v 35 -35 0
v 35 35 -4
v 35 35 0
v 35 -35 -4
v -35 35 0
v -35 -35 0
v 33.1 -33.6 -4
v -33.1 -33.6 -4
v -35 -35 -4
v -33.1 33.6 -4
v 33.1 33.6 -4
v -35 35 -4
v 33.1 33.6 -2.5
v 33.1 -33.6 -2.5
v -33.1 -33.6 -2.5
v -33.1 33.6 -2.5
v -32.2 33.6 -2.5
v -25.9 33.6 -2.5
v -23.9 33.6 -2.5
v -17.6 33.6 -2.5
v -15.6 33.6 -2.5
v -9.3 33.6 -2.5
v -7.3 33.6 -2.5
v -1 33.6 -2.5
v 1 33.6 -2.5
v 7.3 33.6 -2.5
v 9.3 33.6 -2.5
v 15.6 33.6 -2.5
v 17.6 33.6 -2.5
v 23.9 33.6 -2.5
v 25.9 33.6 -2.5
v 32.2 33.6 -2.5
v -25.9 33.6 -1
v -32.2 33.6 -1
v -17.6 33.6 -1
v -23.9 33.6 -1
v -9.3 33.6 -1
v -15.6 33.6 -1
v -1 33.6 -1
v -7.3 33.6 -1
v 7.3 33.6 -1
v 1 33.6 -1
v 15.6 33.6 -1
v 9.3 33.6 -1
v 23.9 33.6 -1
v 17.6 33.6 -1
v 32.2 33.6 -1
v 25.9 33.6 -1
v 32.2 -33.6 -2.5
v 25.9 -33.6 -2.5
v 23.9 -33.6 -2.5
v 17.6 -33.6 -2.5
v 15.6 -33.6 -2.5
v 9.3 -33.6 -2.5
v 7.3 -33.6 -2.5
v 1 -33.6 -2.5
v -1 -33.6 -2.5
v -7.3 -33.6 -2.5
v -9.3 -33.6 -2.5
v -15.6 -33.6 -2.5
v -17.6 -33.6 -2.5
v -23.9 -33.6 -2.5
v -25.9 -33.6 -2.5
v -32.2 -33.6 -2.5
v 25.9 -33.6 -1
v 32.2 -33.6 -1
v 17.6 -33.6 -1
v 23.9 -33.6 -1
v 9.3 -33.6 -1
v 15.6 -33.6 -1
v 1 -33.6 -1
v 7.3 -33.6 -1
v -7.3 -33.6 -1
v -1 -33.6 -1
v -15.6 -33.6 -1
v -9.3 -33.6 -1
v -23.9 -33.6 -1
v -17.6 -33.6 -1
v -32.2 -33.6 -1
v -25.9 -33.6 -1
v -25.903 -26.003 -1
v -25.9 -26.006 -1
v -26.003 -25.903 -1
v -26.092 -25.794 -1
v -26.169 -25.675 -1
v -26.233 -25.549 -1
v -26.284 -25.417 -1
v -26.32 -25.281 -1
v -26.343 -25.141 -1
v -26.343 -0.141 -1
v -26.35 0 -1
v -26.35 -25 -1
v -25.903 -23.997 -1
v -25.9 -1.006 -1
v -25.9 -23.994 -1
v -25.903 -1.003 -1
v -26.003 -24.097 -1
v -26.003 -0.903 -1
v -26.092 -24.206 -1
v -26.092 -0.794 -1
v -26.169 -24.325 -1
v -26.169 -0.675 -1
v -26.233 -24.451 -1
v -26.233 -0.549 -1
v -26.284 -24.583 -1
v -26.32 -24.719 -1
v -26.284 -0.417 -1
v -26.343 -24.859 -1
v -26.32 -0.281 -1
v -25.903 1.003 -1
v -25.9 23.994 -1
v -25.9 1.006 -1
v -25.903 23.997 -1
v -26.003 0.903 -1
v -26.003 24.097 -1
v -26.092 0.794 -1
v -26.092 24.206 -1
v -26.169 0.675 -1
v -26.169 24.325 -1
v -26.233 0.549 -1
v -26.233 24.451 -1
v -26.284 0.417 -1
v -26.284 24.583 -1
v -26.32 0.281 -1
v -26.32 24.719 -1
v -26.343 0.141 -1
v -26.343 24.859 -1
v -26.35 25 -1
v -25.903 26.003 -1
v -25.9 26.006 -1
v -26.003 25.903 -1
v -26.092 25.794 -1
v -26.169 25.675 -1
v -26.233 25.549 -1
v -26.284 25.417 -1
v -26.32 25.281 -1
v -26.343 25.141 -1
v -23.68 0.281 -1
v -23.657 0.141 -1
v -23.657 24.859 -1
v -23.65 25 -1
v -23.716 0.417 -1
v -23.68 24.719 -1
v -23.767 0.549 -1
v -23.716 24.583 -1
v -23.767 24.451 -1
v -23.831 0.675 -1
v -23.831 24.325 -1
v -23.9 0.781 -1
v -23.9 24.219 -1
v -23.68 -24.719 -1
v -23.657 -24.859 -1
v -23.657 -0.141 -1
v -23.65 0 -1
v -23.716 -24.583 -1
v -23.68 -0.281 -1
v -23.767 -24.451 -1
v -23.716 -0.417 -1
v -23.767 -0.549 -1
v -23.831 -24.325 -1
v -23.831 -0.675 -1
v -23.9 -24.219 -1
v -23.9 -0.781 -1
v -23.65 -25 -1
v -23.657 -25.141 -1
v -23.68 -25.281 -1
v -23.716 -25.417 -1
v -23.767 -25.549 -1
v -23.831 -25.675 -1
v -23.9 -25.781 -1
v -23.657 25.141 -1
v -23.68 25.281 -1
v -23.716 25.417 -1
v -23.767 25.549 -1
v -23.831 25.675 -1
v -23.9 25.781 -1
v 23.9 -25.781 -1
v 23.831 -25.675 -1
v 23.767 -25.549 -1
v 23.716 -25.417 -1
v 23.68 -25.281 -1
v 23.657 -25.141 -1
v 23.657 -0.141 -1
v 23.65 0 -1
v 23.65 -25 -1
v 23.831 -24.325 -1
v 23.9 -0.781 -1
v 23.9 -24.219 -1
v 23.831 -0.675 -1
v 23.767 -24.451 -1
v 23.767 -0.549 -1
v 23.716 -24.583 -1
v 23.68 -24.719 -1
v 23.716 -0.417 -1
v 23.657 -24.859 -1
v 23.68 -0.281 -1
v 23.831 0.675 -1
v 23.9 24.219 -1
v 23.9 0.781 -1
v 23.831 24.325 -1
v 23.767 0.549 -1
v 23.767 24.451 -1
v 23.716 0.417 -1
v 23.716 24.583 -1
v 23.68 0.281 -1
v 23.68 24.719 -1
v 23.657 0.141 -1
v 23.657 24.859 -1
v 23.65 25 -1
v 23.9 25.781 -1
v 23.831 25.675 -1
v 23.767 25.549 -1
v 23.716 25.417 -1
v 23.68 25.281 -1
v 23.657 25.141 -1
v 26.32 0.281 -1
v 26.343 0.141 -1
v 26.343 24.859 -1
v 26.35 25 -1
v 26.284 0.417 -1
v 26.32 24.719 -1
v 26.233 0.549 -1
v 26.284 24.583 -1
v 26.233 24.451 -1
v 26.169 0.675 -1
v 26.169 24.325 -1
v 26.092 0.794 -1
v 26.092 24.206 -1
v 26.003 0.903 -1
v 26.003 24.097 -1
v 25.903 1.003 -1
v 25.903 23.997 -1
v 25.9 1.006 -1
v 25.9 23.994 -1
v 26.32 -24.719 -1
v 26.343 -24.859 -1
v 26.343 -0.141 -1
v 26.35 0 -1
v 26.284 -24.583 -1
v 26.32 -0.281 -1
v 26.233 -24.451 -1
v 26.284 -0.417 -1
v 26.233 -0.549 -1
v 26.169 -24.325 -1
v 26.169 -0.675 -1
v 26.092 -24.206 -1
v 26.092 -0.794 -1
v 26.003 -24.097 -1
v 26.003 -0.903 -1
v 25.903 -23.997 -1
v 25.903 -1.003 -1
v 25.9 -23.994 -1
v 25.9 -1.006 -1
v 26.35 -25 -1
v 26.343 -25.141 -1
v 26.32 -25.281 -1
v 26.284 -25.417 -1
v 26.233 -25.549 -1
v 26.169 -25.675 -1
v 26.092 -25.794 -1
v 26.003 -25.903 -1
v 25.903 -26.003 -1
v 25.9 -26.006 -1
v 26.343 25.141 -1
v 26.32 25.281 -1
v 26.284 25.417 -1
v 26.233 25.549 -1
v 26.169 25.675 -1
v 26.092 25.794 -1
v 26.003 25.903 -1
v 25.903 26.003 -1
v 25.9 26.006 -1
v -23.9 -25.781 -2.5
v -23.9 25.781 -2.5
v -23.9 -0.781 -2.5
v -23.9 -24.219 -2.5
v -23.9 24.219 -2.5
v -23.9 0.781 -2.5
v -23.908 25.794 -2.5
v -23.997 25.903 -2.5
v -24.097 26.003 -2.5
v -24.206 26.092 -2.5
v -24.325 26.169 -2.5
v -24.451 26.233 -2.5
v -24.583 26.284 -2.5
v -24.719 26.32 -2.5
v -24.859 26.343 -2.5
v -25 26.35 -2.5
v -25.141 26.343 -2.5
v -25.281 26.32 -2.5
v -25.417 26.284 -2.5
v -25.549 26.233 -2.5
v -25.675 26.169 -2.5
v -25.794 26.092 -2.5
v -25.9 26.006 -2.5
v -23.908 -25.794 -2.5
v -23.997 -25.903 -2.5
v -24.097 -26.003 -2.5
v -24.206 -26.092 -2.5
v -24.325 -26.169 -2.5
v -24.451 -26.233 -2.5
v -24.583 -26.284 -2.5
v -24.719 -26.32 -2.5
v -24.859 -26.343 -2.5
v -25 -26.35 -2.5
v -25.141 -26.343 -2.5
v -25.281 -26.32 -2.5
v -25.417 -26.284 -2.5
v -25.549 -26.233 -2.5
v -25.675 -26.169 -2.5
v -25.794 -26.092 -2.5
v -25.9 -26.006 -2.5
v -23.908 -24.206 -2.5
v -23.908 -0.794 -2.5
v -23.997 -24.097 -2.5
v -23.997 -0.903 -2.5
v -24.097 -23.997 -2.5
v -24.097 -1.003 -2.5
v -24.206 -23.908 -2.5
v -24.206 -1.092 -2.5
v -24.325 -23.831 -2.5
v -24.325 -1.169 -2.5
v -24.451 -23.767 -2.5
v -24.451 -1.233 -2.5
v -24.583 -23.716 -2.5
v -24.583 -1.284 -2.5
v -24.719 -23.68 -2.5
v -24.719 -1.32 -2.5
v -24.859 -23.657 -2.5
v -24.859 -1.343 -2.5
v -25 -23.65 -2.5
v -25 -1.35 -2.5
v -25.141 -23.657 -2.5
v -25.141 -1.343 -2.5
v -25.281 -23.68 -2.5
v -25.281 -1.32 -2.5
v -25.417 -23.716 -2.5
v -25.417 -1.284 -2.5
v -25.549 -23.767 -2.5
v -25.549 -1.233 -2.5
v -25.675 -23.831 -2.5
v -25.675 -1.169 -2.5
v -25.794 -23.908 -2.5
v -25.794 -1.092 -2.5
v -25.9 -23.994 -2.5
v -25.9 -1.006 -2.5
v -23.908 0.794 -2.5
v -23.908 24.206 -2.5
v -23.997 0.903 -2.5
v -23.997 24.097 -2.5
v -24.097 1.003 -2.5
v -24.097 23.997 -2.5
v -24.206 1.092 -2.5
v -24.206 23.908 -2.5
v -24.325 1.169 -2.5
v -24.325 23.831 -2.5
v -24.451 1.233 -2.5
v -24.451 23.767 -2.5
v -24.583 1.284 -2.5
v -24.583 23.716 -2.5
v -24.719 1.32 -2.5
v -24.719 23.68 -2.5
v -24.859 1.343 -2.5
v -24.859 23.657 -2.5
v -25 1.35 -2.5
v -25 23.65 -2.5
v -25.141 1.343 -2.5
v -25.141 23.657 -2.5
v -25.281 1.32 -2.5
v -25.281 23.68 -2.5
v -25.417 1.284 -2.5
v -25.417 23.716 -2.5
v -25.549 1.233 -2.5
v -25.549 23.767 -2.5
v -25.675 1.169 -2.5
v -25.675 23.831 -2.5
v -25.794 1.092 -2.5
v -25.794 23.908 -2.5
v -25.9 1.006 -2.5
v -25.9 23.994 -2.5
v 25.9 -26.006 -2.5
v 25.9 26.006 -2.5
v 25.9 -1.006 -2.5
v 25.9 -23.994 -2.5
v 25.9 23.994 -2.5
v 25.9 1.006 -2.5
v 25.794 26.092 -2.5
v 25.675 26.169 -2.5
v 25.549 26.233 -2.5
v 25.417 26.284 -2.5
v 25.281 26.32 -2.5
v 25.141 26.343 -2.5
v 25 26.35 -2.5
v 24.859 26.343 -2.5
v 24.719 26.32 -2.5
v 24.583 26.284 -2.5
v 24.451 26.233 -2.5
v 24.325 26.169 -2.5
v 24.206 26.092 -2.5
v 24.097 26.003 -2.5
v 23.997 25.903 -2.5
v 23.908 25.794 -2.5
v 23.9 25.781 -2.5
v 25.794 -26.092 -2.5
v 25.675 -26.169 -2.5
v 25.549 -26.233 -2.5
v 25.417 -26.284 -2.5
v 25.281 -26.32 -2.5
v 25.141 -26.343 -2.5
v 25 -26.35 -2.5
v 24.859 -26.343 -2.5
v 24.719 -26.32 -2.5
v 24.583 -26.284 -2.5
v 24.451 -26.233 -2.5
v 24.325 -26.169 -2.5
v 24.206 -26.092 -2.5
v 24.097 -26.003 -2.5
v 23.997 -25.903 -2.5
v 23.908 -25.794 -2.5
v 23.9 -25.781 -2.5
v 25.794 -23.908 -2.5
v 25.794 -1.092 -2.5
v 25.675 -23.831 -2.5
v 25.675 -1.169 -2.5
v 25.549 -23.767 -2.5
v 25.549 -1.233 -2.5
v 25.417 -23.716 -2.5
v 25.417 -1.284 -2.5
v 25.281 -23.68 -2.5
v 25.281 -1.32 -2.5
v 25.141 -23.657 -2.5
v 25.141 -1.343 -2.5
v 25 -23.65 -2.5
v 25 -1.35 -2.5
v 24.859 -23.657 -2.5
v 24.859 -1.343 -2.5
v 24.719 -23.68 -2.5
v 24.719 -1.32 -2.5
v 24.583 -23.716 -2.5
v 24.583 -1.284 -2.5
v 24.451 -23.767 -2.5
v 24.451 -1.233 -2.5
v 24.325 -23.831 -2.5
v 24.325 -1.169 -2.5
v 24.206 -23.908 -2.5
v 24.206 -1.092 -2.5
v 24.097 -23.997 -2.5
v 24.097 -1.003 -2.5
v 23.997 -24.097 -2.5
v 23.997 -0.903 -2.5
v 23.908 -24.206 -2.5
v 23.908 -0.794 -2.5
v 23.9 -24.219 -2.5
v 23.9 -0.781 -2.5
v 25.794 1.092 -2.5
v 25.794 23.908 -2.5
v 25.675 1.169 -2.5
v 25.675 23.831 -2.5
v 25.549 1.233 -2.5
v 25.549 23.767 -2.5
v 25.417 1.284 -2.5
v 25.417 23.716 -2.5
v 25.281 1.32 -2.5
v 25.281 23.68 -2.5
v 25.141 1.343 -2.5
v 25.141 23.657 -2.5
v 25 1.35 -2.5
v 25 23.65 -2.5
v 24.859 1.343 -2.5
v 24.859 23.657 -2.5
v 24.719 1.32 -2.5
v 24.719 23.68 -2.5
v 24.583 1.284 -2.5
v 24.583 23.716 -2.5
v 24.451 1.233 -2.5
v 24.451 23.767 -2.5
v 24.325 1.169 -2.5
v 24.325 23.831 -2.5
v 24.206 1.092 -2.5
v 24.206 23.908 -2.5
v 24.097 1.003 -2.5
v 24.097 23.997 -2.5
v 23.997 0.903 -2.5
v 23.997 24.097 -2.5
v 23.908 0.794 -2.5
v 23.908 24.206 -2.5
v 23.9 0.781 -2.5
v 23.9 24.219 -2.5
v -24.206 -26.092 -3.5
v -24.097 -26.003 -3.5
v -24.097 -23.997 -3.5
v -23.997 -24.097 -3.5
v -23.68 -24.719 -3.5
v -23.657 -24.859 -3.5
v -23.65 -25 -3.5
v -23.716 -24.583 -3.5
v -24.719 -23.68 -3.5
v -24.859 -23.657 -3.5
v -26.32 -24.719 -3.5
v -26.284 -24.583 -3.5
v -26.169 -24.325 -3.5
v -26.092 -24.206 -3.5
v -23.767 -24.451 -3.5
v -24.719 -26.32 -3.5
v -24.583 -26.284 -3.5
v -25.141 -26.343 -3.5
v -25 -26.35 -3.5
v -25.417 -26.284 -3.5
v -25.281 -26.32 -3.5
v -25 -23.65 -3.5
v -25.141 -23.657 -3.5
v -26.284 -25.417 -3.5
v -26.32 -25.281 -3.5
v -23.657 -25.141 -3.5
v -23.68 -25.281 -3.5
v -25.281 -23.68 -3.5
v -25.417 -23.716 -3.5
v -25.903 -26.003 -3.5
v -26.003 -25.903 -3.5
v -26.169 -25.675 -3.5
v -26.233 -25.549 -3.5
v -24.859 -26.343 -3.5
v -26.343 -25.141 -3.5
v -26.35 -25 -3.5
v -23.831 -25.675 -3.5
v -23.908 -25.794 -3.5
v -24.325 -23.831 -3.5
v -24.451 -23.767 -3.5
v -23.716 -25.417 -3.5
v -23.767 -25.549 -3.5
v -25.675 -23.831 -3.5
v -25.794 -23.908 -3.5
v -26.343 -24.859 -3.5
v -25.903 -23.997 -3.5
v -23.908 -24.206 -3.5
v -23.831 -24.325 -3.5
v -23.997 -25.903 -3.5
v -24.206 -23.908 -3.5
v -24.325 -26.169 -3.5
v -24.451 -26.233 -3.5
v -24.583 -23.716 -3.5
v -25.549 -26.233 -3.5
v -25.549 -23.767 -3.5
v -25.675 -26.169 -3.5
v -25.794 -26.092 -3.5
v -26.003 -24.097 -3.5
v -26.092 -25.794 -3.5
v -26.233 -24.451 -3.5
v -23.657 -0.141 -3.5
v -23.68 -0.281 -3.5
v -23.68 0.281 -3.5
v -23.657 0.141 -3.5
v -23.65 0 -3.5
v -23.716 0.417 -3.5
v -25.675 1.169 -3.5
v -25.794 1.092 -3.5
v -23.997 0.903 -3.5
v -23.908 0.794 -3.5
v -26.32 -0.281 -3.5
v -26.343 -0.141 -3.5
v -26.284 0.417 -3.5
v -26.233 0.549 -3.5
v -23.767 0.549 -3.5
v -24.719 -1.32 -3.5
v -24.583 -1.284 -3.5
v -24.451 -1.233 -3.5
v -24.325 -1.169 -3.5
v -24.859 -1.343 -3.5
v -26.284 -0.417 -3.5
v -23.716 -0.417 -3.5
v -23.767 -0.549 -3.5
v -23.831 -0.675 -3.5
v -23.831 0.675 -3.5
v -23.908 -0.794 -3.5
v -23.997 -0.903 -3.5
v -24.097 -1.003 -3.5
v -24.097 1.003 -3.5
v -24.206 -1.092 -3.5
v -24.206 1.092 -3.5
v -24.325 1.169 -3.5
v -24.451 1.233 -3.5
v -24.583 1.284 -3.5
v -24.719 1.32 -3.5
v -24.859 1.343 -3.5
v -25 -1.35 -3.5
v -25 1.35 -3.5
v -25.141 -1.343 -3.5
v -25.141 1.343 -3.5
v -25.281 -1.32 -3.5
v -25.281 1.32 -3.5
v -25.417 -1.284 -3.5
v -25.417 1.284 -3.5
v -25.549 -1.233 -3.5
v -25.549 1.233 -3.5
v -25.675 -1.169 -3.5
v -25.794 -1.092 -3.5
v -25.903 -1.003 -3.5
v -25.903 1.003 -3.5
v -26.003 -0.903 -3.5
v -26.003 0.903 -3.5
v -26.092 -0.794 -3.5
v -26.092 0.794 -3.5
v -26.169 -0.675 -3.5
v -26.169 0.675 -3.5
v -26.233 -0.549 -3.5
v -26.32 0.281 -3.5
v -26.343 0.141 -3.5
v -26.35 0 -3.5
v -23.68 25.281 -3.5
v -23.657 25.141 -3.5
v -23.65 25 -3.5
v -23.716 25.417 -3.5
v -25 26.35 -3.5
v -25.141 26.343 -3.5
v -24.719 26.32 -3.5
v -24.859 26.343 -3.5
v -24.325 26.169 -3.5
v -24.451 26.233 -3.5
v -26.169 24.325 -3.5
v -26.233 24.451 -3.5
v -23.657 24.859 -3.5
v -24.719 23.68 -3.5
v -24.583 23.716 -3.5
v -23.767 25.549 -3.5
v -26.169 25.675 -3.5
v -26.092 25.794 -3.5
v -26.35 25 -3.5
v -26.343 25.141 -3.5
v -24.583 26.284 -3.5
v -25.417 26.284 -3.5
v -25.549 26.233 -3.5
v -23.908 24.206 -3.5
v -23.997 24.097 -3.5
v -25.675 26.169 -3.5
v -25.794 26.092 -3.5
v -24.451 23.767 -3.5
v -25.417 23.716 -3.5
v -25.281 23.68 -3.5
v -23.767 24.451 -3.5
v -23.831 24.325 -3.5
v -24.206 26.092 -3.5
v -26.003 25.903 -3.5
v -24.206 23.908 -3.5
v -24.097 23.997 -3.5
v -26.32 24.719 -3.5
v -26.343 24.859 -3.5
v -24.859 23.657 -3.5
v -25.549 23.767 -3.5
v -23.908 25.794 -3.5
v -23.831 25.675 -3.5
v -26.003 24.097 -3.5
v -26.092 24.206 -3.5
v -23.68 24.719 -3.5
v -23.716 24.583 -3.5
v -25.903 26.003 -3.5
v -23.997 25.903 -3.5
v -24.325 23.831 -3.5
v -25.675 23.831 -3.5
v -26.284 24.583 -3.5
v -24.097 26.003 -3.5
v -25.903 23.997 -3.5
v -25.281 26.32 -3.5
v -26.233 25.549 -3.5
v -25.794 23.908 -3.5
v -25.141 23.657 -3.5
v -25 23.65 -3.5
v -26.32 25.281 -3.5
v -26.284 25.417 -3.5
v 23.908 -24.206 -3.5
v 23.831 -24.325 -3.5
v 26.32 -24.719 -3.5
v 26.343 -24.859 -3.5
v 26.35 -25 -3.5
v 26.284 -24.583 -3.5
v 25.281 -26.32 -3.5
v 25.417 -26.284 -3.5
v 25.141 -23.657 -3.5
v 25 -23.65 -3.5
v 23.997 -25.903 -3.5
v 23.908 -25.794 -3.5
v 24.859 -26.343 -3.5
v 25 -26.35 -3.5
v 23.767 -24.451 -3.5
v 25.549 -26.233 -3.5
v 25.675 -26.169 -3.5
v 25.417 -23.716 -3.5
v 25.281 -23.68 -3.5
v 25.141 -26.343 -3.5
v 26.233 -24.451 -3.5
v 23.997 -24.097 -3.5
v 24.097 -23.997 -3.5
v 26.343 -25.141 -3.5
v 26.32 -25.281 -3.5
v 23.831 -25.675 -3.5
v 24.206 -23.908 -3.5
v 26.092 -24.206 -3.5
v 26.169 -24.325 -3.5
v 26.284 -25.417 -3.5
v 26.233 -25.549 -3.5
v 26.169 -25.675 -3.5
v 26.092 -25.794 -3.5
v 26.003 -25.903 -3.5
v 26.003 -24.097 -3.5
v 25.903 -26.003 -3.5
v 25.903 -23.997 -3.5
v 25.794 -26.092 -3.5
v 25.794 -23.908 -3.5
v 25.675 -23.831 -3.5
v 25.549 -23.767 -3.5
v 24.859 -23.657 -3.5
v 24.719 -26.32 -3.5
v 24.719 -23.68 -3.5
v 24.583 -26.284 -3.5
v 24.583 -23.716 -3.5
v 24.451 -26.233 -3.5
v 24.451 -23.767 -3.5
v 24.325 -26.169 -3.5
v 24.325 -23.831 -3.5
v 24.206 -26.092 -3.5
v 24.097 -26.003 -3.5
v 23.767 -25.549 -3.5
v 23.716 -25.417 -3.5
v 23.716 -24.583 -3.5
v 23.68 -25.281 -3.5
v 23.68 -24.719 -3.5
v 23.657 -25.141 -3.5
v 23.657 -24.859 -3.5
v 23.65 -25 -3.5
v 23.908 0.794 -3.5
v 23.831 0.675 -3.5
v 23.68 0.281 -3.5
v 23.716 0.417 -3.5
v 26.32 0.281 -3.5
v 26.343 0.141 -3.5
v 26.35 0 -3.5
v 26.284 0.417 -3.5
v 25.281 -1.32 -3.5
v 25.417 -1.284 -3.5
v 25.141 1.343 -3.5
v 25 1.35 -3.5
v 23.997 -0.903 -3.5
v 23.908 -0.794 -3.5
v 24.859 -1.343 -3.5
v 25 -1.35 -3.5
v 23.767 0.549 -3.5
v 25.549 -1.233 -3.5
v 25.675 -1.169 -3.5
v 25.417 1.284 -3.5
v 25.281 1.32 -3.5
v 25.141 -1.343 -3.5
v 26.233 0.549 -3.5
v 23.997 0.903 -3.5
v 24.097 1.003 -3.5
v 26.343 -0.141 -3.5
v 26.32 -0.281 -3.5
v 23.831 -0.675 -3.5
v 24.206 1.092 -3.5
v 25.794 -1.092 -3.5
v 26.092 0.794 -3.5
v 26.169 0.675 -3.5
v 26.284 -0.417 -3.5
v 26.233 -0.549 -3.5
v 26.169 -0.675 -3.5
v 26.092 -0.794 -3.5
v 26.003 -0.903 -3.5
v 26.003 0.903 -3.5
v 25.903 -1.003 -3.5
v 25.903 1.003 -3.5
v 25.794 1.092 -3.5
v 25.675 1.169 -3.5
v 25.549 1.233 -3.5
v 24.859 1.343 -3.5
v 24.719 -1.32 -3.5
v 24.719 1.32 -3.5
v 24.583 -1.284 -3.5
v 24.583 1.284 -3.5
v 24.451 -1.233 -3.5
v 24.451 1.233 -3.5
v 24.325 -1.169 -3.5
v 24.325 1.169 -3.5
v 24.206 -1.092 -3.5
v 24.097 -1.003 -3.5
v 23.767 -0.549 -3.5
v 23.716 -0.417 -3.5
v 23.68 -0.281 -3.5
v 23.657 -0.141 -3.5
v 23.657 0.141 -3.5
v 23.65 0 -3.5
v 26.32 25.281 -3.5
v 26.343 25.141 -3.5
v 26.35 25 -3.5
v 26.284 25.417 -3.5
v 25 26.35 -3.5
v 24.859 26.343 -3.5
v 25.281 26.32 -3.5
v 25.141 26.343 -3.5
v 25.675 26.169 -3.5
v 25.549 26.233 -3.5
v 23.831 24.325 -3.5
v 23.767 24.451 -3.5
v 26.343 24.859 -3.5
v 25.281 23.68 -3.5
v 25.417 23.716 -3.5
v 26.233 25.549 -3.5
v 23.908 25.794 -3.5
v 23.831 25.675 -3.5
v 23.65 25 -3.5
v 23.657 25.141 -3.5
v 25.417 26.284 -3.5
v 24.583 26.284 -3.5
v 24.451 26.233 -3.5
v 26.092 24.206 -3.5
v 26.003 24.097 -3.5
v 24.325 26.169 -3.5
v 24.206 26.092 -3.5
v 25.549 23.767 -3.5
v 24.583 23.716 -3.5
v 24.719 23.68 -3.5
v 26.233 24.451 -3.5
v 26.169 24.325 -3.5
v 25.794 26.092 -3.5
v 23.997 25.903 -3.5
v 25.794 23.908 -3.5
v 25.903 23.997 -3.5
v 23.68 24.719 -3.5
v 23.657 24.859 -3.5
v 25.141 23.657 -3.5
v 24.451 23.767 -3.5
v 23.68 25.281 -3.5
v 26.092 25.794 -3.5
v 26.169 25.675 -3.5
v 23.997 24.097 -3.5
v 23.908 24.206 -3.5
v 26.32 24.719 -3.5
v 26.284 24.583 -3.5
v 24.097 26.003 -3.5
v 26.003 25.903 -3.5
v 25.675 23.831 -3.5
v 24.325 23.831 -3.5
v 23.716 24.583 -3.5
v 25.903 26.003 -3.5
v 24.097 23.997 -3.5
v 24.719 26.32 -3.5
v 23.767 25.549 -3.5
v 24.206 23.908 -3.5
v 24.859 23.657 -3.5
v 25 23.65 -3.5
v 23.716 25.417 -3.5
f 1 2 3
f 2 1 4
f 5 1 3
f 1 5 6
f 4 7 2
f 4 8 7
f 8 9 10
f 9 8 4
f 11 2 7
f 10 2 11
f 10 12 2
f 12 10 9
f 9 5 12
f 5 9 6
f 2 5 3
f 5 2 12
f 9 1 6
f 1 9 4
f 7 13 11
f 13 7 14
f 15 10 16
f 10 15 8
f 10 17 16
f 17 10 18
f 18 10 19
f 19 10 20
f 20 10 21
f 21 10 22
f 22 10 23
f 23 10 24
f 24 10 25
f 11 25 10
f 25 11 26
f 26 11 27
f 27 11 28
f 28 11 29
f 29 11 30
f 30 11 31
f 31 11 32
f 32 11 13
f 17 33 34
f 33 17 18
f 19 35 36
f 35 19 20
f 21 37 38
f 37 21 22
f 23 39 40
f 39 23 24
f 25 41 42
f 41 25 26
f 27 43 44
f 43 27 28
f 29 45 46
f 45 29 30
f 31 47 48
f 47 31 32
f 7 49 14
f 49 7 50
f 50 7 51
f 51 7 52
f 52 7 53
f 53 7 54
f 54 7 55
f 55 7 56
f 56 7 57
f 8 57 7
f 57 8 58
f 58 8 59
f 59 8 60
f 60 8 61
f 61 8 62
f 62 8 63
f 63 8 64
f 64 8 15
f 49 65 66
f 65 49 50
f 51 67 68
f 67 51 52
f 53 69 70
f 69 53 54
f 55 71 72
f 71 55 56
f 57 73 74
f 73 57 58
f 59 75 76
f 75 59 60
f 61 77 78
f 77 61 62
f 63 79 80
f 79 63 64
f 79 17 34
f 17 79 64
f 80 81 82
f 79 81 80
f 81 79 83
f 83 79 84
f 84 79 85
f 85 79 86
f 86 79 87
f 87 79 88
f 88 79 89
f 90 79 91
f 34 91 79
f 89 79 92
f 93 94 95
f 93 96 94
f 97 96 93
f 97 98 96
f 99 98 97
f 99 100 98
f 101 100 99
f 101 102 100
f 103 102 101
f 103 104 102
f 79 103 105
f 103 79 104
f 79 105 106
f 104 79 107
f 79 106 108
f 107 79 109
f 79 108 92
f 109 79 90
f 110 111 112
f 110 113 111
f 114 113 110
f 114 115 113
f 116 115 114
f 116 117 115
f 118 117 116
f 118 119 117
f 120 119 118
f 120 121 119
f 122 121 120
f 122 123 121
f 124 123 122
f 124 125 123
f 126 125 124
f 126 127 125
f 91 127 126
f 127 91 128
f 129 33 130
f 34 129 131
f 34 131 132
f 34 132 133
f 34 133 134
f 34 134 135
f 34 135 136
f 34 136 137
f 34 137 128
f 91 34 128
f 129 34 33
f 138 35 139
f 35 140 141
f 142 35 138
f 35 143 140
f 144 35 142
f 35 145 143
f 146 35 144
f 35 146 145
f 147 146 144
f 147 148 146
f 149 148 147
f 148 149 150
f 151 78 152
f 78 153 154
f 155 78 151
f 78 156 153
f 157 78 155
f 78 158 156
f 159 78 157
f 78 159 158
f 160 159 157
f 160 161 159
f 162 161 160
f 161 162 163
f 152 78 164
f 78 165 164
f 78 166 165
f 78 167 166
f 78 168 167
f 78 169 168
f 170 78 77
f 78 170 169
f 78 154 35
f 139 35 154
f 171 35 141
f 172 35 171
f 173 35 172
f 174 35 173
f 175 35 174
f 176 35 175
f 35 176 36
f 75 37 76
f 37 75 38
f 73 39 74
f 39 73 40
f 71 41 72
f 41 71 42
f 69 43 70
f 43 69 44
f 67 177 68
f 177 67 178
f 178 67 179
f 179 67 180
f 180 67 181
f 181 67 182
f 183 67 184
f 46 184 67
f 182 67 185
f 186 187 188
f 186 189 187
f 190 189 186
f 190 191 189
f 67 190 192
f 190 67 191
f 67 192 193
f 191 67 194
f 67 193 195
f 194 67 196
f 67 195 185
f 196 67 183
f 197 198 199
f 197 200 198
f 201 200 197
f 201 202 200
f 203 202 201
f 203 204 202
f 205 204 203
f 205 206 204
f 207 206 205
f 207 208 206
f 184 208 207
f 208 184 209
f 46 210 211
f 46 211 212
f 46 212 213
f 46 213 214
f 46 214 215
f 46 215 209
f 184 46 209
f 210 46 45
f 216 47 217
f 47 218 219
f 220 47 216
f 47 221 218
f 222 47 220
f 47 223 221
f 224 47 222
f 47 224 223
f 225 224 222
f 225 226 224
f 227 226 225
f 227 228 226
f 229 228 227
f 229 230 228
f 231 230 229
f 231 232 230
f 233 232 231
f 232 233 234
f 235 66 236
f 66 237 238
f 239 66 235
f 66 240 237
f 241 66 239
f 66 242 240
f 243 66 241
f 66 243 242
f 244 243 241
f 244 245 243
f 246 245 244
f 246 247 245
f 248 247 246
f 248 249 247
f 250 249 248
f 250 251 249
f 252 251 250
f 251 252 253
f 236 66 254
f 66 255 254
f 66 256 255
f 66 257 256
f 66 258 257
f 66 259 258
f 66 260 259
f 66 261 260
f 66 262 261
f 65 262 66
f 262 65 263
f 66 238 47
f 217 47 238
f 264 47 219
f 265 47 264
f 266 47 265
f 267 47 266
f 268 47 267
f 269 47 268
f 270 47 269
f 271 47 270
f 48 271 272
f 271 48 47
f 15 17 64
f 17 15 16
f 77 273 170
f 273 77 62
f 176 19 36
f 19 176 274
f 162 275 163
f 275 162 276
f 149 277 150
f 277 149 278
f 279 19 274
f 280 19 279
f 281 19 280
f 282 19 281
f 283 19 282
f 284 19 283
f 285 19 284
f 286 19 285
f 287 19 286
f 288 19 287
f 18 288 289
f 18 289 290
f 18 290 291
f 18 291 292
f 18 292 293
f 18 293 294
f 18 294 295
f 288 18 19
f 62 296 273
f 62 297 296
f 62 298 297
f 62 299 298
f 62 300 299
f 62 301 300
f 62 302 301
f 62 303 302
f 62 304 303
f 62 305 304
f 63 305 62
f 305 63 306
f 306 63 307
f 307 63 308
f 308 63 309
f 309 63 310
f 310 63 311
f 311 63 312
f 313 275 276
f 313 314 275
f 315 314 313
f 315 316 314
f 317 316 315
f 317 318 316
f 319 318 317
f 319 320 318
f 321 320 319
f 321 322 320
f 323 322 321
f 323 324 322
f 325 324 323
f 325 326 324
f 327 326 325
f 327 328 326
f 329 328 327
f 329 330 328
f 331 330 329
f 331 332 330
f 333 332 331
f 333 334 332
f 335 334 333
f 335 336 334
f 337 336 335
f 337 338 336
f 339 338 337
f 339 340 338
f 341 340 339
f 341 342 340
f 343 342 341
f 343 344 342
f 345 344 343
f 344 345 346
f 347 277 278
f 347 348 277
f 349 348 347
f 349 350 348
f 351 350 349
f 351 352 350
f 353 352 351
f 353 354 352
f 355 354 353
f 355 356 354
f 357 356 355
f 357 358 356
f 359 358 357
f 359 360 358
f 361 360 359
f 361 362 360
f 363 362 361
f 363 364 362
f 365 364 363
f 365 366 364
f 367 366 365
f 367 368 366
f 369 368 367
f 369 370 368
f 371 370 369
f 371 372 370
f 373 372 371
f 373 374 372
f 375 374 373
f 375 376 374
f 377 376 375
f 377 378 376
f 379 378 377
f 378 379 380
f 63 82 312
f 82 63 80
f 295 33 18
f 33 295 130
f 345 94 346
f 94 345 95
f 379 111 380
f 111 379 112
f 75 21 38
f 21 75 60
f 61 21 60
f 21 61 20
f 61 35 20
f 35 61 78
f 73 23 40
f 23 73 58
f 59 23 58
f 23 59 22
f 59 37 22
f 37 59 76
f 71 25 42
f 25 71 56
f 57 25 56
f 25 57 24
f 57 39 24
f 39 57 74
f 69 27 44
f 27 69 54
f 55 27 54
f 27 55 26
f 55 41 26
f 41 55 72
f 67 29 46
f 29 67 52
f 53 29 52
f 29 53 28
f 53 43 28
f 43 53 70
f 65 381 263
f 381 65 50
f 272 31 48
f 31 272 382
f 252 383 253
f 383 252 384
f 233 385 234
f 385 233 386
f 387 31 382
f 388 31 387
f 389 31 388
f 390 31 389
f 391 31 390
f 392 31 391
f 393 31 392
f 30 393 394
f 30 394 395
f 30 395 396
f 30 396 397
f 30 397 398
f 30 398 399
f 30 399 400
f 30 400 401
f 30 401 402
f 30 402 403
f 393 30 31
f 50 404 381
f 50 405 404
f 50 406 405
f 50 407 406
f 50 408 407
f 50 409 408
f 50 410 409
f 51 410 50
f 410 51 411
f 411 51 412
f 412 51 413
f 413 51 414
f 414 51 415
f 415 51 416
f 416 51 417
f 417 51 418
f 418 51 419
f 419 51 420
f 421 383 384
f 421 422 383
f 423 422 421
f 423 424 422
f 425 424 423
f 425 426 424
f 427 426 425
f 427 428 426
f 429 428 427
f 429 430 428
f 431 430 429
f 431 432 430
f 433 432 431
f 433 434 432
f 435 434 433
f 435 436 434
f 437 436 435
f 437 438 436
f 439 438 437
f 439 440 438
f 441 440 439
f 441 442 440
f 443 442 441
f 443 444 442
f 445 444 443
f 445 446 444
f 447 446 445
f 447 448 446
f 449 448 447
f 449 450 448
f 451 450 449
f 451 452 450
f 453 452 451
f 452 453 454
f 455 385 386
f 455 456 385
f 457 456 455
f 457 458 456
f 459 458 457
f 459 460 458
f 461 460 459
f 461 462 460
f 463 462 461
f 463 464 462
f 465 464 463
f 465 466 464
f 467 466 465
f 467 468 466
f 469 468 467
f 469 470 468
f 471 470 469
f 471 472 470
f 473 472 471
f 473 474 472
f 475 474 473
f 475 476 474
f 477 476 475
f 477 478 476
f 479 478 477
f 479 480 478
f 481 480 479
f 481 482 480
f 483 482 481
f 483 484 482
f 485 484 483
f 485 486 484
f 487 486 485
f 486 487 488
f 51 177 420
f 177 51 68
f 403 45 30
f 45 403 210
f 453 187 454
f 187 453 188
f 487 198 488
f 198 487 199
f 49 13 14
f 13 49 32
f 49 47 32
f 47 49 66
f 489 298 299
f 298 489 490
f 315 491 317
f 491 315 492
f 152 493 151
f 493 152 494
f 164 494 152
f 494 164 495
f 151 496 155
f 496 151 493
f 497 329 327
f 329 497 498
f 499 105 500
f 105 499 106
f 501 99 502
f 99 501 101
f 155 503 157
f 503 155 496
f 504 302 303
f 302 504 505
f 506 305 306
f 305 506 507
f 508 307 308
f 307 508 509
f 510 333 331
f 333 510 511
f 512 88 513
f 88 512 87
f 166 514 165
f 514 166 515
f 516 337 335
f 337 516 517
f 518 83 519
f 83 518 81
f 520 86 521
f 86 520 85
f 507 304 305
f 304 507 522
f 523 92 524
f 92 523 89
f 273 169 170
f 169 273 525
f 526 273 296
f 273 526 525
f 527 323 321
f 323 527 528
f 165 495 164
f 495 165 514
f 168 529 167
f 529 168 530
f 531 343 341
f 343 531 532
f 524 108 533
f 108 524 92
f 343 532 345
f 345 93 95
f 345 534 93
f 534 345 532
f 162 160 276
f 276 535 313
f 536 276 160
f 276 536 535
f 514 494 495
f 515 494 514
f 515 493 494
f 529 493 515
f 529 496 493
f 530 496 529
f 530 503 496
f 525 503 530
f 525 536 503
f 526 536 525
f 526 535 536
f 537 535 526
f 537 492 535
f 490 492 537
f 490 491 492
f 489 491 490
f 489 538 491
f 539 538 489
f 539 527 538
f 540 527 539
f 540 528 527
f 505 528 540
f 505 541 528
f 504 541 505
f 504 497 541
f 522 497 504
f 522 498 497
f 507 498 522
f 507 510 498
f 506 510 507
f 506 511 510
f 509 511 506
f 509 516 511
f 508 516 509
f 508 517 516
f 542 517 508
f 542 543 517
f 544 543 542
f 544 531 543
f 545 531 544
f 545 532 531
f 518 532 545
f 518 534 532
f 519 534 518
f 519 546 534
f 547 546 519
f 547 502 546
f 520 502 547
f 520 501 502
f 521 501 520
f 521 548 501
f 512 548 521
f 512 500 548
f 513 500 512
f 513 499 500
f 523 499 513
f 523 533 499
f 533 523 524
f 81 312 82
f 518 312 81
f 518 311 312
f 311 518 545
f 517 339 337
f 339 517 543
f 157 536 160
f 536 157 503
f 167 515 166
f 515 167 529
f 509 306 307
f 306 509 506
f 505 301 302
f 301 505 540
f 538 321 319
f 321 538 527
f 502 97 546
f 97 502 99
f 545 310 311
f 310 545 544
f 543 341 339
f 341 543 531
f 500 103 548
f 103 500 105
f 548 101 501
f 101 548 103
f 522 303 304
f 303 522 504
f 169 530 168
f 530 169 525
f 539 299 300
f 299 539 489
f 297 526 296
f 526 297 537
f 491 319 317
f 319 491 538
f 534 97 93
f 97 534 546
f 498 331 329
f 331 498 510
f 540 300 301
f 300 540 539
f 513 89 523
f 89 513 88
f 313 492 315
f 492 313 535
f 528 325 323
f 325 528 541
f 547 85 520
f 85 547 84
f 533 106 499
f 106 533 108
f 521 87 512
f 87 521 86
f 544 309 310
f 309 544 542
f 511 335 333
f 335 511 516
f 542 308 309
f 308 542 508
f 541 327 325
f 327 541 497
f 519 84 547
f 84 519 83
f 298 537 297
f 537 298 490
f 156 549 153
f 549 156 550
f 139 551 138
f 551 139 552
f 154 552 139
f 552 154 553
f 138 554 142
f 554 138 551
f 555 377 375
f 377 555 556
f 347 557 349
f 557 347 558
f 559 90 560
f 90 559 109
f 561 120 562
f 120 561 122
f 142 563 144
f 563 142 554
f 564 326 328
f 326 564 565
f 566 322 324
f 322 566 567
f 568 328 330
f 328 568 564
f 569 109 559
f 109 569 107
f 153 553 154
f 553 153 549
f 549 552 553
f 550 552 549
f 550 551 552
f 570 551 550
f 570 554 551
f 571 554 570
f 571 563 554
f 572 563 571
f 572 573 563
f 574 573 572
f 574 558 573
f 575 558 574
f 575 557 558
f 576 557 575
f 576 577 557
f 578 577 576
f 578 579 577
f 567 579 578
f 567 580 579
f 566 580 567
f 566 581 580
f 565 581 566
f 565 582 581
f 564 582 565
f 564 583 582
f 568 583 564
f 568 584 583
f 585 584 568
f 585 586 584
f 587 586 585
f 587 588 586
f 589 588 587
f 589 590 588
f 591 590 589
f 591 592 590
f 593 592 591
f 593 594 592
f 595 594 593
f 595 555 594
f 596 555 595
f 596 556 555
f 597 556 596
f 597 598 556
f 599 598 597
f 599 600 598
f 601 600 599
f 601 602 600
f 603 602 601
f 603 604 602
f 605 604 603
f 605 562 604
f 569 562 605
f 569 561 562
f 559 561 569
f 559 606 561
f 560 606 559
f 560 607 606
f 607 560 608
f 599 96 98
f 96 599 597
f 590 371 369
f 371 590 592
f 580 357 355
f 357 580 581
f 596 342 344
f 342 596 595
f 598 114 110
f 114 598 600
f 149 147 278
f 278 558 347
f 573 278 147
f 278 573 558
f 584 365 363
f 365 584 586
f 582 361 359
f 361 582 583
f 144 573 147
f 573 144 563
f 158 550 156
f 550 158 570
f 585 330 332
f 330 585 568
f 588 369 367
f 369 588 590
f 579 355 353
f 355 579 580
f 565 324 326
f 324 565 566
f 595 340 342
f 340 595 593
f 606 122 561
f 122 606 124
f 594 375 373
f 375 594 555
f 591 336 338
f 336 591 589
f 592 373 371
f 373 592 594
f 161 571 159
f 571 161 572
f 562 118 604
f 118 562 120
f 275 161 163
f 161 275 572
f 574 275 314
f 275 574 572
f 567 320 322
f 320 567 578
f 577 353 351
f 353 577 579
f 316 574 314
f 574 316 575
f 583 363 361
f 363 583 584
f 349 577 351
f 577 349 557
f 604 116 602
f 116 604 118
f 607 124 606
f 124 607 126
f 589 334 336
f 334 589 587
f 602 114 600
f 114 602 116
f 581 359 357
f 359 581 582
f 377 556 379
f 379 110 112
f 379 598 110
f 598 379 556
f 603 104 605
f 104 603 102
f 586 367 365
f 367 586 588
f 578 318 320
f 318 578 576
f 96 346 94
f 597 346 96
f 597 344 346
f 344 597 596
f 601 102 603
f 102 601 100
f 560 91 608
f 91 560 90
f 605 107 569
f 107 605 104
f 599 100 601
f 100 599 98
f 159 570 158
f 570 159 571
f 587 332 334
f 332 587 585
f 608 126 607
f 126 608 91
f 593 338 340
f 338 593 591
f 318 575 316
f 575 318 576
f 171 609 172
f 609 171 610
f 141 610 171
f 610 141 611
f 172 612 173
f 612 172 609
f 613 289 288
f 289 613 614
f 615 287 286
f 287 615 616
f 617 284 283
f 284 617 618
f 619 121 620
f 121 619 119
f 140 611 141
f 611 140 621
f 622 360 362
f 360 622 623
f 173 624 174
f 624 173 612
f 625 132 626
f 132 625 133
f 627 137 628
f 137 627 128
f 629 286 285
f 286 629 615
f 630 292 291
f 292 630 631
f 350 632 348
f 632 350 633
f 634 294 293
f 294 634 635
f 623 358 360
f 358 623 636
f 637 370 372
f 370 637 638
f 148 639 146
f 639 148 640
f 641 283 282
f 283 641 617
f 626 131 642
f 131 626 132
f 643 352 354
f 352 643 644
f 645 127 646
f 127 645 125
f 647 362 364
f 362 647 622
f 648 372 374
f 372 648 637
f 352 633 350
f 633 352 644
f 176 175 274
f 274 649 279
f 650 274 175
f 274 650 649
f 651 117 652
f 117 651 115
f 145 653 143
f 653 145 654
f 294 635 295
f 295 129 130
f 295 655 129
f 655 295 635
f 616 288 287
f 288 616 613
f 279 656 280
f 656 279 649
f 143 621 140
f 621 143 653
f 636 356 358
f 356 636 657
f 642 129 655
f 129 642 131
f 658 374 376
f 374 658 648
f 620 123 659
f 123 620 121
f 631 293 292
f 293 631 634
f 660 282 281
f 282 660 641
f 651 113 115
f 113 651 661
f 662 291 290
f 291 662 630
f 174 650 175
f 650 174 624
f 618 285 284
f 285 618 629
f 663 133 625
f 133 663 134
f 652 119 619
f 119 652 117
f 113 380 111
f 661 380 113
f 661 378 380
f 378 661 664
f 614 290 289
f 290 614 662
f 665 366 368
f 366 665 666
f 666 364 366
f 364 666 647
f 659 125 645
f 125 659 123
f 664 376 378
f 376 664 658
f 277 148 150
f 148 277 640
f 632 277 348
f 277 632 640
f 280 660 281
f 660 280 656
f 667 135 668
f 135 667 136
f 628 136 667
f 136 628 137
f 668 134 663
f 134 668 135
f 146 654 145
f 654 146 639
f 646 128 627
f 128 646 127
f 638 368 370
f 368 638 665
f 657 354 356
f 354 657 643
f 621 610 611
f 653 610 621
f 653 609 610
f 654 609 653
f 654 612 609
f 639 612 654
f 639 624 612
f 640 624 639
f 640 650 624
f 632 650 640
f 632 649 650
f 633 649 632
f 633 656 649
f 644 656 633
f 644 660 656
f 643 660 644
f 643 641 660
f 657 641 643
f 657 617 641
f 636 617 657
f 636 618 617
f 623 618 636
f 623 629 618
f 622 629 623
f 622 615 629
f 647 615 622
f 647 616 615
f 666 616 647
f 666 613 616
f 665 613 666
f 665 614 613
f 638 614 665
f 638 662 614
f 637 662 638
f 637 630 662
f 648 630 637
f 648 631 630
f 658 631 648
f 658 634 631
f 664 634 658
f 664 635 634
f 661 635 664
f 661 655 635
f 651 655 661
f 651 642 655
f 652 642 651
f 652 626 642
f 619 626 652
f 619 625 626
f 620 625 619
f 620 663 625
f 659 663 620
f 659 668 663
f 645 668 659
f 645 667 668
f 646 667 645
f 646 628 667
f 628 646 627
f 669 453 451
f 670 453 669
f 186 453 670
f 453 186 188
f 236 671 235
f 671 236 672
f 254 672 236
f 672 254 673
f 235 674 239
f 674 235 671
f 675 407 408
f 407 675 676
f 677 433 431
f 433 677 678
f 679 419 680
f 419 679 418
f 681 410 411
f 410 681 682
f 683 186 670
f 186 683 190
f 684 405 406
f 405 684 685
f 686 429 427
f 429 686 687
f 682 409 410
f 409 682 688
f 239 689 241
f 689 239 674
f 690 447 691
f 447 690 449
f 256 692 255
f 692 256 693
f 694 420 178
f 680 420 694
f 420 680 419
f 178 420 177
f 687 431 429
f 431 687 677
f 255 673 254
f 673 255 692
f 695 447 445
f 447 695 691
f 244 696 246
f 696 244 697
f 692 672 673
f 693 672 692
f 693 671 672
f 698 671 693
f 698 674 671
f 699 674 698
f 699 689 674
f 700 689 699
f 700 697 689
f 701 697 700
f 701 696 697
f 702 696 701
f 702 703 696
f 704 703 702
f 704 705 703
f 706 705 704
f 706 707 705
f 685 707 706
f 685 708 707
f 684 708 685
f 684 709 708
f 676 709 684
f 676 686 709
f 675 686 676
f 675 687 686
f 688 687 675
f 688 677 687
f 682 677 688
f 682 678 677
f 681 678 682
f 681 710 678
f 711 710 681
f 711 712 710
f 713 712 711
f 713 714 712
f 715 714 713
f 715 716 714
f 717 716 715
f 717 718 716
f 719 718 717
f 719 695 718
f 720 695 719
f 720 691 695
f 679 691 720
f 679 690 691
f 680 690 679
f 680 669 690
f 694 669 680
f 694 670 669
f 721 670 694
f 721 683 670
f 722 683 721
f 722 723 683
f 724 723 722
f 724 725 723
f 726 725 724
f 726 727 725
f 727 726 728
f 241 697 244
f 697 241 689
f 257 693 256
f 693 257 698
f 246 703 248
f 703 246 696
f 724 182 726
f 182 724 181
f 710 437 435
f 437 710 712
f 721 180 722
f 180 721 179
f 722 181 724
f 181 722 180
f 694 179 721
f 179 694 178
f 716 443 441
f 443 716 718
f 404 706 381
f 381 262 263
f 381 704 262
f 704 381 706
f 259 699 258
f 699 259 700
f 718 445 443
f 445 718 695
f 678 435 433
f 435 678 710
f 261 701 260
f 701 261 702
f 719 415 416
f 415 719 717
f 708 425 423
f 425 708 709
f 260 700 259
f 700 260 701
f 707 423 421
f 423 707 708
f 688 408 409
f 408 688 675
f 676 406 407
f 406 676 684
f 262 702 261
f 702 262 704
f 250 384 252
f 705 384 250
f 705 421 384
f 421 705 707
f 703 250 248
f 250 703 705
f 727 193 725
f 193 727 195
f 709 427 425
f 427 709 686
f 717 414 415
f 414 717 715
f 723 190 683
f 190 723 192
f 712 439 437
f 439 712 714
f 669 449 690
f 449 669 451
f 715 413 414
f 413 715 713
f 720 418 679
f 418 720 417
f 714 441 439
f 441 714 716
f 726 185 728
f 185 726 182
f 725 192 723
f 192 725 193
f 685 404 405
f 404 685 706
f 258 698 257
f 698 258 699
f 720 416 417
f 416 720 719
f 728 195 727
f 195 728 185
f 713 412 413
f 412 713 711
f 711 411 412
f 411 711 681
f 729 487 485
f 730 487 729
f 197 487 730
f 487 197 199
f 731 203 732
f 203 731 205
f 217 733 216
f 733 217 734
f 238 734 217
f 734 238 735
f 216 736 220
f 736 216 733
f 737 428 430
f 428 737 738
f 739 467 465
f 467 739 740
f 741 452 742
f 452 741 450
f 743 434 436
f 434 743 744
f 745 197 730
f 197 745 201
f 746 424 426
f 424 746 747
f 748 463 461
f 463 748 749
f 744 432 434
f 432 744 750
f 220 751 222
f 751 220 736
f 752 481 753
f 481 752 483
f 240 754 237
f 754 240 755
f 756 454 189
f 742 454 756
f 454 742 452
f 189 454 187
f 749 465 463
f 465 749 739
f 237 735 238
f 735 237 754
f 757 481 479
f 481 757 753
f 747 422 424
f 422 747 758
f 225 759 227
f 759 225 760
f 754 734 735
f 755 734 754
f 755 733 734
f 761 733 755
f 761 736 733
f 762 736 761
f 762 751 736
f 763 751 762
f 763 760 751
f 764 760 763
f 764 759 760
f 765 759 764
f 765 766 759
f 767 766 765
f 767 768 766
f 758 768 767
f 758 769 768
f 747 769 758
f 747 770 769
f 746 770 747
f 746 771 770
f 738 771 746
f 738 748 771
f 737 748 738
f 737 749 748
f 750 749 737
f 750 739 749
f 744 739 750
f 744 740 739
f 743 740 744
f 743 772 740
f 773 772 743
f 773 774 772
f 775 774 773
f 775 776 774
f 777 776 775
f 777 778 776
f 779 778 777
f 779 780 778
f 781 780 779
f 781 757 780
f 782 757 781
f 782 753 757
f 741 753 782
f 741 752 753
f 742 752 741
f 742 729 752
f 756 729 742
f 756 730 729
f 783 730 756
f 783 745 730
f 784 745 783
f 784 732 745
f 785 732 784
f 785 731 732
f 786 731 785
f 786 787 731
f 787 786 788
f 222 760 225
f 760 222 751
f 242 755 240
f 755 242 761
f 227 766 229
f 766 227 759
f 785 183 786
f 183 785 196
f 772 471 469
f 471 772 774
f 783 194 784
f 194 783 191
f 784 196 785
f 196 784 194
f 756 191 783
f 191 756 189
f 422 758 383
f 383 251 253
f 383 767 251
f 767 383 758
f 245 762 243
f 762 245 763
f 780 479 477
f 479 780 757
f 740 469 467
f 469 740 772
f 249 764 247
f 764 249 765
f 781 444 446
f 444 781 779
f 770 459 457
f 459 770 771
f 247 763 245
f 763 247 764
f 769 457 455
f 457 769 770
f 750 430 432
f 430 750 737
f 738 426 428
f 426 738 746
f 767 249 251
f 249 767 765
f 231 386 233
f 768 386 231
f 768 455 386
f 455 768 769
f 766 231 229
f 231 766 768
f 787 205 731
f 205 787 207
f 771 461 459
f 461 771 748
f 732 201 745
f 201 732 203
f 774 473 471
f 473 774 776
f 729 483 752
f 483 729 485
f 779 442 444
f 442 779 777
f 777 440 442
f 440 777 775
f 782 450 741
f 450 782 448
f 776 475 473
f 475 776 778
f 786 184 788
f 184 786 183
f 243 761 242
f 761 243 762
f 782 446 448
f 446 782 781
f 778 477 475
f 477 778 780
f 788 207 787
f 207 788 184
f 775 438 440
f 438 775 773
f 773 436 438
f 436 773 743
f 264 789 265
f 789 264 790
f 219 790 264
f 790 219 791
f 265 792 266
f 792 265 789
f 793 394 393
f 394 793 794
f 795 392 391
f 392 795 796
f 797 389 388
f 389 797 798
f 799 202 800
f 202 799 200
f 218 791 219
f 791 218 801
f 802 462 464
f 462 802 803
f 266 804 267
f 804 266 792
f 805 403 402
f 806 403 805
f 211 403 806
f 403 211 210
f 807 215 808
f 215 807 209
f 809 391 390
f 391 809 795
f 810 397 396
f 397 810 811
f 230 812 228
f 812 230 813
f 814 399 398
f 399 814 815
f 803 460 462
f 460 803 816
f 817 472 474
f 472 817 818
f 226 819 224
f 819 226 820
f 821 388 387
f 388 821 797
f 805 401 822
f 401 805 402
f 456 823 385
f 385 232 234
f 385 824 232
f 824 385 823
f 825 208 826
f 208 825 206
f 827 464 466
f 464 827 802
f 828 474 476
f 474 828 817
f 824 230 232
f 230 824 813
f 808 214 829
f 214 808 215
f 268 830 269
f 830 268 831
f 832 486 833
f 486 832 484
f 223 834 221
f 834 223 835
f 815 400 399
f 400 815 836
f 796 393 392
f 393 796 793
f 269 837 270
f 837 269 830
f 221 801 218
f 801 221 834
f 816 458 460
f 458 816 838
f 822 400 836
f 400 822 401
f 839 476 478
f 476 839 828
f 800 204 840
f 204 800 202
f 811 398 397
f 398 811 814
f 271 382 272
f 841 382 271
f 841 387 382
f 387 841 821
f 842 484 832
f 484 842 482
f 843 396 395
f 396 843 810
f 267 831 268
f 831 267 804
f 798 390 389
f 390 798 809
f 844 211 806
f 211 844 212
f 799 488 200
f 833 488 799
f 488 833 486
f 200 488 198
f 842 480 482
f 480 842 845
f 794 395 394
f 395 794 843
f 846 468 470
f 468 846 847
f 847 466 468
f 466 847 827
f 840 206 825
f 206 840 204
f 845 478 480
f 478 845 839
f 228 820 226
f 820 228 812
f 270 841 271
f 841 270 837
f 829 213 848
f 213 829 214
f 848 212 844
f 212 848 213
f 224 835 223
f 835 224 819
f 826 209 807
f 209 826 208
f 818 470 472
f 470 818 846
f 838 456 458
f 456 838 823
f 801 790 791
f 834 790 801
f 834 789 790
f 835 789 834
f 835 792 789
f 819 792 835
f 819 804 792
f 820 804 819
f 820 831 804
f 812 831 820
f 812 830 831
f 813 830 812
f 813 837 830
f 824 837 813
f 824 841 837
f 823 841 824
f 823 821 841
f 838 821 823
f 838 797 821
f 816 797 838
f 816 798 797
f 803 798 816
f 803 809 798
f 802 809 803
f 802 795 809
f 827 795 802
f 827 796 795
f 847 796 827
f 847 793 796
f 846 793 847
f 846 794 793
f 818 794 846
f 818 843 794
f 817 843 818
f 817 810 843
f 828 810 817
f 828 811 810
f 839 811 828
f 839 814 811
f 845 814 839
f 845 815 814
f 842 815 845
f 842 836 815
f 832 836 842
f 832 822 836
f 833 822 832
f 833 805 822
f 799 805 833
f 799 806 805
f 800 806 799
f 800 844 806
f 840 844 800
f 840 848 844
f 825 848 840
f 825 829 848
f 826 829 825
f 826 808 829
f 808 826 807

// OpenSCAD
board_x=66.2;
board_y=67.2;


translate([0,0,-.5]) cover_test();
//translate([0,0,-3]) matrix();

module cover_test(){
    cube([70,70,1], center=true);
  translate([0,0,-1.5])
  difference(){
    cube([70,70,4], center=true);
    translate([0,0,-0.5]) cube([board_x,board_y,4], center=true);
//    for(X=[-3.5,-2.5,-1.5,-0.5,0.5,1.5,2.5,3.5], 
//        Y=[-3.5,-2.5,-1.5,-0.5,0.5,1.5,2.5,3.5])
//      translate([X*8,Y*8,1.2]) cube([5.6, 5.6, 1.65], center=true);
  }
  for(X=[-4,-3,-2,-1,0,1,2,3,4])
    translate([8.3*X,0,-1.25]) cube([2,70,1.5], center=true);
  for(X=[-1,1], Y=[-1,0,1])
    translate([25*X,25*Y,-3]) cylinder(d=2.7, h=3, $fn=60);
}

module matrix(){
  color("grey") cube([board_x,board_y,1.6], center=true);
  for(X=[-3.5,-2.5,-1.5,-0.5,0.5,1.5,2.5,3.5], 
      Y=[-3.5,-2.5,-1.5,-0.5,0.5,1.5,2.5,3.5])
  translate([X*8,Y*8,1.5]) ws2812b();
}

module ws2812b(){
    color("white") cube([5,5,1.6], center=true);
    for(X=[-1,1], Y=[-1,1])
      translate([(0.45+1.7)*X,1.7*Y,-0.4]) 
        color("silver") cube([0.9,0.9,0.8], center=true);
}
